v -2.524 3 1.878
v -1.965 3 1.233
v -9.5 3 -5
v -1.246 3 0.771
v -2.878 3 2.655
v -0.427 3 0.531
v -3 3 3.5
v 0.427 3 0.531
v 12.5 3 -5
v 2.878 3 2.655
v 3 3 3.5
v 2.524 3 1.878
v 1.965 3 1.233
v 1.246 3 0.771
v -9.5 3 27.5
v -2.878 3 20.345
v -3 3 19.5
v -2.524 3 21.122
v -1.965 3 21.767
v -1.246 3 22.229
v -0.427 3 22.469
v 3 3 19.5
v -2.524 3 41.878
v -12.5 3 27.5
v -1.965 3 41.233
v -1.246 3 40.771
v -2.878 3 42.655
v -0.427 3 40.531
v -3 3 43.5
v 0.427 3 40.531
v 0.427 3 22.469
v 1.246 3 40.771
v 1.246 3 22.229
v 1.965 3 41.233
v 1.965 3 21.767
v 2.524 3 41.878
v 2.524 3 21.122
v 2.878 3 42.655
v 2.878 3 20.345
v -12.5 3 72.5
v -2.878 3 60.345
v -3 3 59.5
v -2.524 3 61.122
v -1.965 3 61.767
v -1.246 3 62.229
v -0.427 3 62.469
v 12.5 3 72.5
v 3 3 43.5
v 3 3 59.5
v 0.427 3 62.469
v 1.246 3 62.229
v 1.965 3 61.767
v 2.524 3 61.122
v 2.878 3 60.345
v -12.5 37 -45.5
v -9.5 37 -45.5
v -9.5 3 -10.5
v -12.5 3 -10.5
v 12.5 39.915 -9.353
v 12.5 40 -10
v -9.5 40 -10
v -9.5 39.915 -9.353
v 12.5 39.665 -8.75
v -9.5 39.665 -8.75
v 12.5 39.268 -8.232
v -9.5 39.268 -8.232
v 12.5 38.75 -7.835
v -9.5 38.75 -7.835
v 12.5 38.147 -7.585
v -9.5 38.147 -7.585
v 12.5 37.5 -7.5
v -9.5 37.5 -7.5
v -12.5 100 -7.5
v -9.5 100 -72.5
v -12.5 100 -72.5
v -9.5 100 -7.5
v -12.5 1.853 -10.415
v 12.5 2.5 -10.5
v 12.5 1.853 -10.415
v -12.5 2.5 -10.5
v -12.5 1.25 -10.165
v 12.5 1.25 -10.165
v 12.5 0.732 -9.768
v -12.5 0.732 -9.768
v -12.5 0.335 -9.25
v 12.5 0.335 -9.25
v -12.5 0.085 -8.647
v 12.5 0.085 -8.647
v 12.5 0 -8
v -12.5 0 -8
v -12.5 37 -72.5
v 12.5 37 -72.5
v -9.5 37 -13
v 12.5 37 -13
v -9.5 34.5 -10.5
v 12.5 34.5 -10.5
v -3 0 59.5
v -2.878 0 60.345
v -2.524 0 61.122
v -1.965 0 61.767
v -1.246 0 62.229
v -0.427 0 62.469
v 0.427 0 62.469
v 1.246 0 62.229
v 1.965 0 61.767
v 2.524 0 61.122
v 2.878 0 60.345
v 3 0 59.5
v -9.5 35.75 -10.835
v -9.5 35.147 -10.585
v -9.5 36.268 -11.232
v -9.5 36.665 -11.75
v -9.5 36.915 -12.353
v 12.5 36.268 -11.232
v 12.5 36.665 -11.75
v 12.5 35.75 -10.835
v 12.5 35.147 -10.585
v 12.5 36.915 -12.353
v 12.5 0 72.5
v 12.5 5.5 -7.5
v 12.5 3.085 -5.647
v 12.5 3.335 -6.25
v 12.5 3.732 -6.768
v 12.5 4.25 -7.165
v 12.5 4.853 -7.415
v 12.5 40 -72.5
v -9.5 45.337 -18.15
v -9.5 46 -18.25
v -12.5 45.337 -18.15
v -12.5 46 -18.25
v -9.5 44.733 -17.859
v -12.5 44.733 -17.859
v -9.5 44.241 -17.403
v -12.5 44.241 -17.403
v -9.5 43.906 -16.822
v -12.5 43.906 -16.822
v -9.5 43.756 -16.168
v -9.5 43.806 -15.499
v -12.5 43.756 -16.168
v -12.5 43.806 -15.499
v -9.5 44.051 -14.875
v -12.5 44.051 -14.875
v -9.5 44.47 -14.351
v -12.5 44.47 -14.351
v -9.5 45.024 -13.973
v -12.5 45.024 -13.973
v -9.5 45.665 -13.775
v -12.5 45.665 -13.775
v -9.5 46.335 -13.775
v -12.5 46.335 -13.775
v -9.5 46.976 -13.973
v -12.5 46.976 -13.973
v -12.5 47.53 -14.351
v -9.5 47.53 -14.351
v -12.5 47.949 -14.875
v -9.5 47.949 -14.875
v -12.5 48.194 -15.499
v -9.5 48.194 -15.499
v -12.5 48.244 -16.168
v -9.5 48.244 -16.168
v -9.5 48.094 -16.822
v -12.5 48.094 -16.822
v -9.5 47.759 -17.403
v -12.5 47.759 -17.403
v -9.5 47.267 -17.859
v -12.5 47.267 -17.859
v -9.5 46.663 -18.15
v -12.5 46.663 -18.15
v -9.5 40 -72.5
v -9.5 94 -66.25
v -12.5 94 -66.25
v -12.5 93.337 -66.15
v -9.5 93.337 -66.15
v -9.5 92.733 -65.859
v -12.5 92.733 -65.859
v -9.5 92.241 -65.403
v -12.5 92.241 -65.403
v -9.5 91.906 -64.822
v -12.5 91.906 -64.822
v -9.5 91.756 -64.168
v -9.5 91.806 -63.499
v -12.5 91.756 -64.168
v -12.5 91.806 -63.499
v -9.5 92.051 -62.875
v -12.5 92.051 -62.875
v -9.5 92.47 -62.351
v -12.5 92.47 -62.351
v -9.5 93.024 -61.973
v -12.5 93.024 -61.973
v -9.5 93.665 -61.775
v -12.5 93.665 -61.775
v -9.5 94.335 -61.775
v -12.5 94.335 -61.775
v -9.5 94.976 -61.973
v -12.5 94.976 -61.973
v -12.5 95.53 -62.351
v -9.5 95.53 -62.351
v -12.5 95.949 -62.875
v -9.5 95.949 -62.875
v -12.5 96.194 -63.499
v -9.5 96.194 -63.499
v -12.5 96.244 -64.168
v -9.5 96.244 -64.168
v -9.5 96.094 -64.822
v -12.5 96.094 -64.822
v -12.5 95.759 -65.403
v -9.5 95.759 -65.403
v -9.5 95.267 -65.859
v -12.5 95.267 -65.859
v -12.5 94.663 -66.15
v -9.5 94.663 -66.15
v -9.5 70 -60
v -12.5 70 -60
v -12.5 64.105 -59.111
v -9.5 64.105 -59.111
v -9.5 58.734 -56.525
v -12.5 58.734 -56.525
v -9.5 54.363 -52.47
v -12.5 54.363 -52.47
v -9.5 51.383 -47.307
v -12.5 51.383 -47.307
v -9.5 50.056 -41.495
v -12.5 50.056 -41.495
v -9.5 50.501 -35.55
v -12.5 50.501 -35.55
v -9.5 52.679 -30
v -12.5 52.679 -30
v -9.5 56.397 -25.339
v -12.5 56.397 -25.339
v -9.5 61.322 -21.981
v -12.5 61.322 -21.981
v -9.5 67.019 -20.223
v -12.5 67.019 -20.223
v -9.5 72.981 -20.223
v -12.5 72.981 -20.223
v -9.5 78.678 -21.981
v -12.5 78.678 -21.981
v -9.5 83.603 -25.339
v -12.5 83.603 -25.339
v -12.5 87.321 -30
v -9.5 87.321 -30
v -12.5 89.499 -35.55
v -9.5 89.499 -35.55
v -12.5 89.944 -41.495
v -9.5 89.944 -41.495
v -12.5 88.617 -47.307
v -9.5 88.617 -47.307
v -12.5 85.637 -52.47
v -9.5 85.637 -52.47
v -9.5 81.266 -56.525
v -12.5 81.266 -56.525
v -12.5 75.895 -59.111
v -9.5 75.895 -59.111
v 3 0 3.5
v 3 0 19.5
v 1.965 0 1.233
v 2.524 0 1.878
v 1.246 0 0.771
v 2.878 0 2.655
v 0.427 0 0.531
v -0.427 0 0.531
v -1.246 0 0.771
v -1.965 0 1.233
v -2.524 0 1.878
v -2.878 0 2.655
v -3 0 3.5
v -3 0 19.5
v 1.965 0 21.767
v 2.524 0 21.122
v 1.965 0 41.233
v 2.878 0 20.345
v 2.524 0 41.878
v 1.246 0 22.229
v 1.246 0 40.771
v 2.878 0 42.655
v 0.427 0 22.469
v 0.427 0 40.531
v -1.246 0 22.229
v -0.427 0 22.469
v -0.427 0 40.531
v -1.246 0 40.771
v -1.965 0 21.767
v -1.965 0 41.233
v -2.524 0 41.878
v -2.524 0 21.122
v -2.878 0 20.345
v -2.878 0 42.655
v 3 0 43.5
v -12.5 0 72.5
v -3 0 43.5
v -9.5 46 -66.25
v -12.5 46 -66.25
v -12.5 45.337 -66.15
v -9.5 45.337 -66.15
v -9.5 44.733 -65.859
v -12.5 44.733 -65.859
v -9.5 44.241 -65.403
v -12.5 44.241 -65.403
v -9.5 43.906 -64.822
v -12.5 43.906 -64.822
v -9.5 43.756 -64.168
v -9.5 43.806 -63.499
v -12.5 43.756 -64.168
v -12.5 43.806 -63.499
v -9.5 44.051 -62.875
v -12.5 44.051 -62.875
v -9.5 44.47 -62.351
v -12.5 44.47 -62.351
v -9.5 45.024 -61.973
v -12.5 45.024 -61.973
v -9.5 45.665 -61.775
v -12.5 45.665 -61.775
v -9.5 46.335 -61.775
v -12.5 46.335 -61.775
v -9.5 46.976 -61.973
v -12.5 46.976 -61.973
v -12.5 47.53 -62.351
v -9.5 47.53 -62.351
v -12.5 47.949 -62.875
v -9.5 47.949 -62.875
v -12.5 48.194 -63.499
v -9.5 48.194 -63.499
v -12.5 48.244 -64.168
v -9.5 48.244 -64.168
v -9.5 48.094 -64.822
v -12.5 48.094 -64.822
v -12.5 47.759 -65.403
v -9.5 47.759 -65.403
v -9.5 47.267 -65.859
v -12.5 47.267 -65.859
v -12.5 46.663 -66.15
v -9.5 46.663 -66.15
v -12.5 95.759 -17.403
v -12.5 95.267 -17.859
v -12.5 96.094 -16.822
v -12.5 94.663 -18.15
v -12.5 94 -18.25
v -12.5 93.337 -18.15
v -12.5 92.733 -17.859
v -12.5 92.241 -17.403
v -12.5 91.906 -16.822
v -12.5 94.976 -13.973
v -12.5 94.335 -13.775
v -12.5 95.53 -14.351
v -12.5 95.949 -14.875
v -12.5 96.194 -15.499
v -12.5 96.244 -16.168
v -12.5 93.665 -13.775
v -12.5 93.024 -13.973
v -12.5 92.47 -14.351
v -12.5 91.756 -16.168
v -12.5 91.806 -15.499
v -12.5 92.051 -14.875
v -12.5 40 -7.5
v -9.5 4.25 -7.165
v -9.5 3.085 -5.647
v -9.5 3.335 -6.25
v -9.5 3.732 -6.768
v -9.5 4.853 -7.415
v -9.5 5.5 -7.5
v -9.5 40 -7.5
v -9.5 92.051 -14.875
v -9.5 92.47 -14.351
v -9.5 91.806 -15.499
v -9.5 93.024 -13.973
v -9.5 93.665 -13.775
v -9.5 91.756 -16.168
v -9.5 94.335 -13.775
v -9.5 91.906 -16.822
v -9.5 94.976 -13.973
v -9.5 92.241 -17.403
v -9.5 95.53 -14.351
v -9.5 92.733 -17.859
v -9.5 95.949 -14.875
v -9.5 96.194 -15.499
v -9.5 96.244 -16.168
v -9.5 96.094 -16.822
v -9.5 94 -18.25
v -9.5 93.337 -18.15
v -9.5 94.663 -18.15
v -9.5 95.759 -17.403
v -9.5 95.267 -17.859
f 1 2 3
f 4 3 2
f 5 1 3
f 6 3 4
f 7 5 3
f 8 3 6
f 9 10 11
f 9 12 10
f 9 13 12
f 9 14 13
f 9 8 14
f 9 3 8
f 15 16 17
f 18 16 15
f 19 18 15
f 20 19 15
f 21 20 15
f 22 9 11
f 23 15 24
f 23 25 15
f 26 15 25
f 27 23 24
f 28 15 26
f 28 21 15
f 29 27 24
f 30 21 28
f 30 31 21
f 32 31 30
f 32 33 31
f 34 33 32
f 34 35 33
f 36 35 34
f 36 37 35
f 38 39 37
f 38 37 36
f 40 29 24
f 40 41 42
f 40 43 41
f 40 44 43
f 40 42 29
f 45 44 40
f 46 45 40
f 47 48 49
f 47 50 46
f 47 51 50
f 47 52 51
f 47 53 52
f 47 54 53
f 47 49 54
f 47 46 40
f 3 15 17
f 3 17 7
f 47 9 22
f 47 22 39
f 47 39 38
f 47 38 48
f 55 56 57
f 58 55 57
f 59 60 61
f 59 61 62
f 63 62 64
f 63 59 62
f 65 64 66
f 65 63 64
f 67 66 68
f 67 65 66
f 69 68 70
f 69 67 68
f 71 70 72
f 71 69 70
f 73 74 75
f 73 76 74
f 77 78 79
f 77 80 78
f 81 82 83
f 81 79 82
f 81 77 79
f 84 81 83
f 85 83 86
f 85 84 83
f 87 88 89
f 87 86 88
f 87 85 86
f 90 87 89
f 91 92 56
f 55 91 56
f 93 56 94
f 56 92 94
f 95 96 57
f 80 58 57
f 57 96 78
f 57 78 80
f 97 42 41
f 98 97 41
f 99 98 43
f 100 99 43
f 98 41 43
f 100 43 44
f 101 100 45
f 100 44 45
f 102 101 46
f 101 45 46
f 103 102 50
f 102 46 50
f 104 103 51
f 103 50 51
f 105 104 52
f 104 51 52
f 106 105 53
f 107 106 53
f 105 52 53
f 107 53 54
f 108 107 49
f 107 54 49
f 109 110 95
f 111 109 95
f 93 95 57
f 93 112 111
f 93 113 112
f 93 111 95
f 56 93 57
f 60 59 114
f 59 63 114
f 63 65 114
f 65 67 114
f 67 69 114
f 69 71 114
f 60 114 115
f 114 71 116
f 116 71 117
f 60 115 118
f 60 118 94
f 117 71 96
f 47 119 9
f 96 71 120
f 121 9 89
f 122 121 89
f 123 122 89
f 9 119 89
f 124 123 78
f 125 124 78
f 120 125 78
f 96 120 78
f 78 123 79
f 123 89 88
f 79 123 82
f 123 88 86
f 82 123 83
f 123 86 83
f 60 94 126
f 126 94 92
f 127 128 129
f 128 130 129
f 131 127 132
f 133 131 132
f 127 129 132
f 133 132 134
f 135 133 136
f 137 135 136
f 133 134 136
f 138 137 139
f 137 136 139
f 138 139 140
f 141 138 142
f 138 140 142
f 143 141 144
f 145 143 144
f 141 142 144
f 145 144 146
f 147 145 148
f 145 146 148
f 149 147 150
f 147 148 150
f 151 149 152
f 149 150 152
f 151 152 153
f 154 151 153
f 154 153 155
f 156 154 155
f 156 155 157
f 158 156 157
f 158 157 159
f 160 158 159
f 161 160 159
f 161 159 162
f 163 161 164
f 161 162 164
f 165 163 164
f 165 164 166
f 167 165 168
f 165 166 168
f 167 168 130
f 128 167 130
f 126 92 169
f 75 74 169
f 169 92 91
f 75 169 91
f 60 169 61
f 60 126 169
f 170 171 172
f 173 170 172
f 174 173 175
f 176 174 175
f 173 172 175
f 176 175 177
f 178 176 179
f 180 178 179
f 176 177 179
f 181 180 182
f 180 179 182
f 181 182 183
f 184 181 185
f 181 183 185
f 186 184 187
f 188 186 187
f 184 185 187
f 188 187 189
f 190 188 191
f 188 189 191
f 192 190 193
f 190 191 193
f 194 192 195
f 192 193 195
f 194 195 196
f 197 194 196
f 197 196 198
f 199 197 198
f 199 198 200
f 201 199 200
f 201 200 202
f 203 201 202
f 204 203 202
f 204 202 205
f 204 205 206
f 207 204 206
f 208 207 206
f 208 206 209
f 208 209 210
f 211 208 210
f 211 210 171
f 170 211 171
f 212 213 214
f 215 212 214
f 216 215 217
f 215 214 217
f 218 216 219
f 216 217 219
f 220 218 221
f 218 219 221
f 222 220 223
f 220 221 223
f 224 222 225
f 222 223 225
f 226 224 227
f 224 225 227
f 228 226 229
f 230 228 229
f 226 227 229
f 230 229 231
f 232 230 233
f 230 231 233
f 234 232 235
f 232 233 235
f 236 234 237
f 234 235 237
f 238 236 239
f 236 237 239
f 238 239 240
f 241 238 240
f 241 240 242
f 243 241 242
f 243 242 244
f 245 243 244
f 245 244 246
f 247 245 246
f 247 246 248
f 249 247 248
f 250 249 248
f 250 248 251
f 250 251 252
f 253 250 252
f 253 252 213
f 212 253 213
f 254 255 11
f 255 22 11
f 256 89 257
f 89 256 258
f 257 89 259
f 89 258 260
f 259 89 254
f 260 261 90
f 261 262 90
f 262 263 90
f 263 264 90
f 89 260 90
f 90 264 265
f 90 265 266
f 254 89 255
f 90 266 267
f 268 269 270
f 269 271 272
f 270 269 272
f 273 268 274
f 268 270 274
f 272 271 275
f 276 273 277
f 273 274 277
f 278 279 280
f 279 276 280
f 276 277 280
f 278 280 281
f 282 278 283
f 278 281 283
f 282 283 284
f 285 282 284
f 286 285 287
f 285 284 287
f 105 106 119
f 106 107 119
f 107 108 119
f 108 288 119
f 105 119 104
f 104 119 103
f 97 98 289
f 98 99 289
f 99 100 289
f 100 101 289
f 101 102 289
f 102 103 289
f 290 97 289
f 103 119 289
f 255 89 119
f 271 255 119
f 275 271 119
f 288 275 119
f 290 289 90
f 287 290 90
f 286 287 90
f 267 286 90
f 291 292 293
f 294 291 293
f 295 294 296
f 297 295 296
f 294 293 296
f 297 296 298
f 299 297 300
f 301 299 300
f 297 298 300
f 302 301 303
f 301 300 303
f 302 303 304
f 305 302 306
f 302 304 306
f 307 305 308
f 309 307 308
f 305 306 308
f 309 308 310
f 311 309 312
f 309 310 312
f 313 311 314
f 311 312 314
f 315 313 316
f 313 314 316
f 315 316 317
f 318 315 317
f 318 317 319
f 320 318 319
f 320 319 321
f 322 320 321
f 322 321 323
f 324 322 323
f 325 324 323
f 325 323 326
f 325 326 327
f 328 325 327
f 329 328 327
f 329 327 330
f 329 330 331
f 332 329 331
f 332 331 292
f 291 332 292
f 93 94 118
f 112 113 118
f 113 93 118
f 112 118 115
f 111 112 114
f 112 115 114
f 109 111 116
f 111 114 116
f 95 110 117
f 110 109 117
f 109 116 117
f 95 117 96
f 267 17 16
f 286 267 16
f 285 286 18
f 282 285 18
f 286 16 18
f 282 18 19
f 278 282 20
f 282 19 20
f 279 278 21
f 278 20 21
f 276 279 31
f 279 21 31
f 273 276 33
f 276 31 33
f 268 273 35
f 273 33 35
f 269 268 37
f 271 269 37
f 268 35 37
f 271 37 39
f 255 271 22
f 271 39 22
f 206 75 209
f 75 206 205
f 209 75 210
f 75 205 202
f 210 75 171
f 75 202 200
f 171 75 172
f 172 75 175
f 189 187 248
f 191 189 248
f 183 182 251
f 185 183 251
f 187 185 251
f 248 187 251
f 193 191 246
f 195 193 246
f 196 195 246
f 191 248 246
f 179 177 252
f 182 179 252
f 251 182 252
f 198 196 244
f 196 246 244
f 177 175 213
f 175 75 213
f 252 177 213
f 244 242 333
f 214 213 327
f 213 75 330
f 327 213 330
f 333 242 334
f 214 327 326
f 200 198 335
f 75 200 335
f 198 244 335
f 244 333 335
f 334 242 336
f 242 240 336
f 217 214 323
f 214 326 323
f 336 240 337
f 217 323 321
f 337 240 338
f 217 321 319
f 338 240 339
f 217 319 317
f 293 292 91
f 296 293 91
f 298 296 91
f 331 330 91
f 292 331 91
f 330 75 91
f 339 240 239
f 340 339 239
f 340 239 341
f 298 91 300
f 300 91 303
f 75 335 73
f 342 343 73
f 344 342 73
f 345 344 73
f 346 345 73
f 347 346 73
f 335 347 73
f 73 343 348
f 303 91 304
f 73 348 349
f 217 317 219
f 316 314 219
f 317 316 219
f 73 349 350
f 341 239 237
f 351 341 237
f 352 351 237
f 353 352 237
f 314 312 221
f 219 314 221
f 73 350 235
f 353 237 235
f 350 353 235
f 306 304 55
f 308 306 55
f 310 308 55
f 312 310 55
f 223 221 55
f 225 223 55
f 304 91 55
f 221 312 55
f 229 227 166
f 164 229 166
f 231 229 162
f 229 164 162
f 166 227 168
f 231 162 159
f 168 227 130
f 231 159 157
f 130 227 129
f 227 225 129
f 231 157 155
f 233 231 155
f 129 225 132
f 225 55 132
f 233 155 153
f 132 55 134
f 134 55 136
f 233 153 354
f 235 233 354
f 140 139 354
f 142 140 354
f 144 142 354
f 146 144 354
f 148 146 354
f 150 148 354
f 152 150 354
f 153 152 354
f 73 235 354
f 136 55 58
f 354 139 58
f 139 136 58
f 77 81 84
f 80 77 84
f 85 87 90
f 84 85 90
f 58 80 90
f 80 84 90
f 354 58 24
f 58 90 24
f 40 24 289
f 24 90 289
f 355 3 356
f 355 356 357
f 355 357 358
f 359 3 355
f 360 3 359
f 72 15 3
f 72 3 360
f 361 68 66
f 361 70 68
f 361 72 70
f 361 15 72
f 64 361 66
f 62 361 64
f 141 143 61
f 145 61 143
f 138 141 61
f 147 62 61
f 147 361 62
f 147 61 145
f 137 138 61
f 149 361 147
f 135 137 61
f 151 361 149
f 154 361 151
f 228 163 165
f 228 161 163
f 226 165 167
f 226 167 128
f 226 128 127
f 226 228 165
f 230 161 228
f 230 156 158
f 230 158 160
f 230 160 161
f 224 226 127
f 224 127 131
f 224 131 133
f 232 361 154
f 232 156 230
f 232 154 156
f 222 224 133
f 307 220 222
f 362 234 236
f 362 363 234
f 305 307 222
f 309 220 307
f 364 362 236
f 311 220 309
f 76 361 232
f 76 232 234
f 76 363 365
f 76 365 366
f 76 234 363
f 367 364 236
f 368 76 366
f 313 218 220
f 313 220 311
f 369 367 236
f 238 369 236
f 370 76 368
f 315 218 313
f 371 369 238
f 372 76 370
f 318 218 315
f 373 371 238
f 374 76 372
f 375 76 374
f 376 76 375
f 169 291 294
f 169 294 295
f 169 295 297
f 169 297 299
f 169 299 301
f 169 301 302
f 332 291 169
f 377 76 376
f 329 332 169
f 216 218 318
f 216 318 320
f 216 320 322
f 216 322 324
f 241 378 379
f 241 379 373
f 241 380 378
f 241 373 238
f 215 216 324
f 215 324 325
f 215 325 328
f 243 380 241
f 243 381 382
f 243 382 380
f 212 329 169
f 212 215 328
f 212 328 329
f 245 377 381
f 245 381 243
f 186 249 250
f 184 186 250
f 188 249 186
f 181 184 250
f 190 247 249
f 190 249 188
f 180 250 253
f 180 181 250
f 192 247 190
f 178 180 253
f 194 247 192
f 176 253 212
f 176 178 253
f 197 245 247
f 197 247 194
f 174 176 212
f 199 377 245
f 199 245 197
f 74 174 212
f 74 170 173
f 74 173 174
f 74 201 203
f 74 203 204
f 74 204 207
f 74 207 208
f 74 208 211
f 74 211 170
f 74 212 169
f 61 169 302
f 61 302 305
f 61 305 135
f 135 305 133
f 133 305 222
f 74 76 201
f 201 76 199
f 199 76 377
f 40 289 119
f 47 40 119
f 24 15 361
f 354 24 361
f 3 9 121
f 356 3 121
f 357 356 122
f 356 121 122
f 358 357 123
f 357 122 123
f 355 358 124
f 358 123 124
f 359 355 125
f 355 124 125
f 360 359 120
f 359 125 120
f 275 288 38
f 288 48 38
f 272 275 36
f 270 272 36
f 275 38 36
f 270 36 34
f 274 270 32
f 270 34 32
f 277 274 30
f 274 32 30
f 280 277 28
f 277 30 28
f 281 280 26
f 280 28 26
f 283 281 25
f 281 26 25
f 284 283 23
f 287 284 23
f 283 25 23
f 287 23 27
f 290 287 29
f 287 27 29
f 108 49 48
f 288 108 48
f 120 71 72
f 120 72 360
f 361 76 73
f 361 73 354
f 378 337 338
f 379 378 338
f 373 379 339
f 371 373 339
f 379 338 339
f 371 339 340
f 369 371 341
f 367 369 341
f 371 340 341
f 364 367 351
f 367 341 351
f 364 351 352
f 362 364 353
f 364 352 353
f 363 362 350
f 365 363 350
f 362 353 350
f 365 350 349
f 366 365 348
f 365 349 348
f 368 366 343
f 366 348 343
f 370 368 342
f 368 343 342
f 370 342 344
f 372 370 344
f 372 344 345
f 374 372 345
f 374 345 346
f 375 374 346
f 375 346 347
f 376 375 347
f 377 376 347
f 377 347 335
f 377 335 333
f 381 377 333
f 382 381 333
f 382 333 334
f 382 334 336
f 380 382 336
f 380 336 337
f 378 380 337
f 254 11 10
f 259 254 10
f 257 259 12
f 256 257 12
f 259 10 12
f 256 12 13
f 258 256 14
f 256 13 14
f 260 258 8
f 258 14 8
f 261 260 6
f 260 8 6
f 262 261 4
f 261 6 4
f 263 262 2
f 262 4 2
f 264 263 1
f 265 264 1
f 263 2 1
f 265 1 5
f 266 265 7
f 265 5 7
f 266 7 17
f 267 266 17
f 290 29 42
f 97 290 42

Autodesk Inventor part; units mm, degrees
ref_plane "YZ Plane" through (0, 0, 0) normal (1, 0, 0) x (0, 1, 0)
ref_plane "XZ Plane" through (0, 0, 0) normal (0, 1, 0) x (-1, 0, 0)
ref_plane "XY Plane" through (0, 0, 0) normal (0, 0, 1) x (1, 0, 0)
sketch "Skizze1" plane through (0, 0, 0) normal (0, 1, 0) x (-1, 0, 0)
  line L0 (12.5, 72.5) -> (-12.5, 72.5)
  line L1 (-12.5, 72.5) -> (-12.5, -72.5)
  line L2 (-12.5, -72.5) -> (12.5, -72.5)
  line L3 (12.5, -72.5) -> (12.5, 72.5)
  point P0 (0, 0)
  point P1 (0, 72.5)
  point P2 (-12.5, 0)
  dimension "d0" = 25
  dimension "d1" = 145
extrude "Extrusion1" add sketch "Skizze1" along normal blind 100
sketch "Skizze2" plane through (12.5, 0, 72.5) normal (1, 0, 0) x (0, 0, -1)
  line L0 (0, 0) -> (145, 0) construction
  line L1 (145, 0) -> (145, 100) construction
  line L2 (0, 100) -> (145, 100) construction
  line L3 (0, 0) -> (0, 100) construction
  line L4 (0, 100) -> (80, 100)
  line L5 (80, 100) -> (80, 40)
  line L6 (80, 40) -> (0, 40)
  line L7 (0, 40) -> (0, 100)
  point P0 (72.5, 0)
  dimension "d4" = 80
  dimension "d5" = 60
extrude "Extrusion2" cut sketch "Skizze2" against normal through all
sketch "Skizze3" plane through (12.5, 0, 72.5) normal (1, 0, 0) x (0, 0, -1)
  line L0 (80, 100) -> (80, 40) construction
  line L1 (80, 40) -> (0, 40) construction
  line L2 (0, 0) -> (0, 40) construction
  line L3 (0, 0) -> (145, 0) construction
  line L4 (145, 0) -> (145, 100) construction
  line L5 (80, 100) -> (145, 100) construction
  line L6 (0, 40) -> (80, 40)
  line L7 (80, 40) -> (80, 3)
  line L8 (80, 3) -> (0, 3)
  line L9 (0, 3) -> (0, 40)
  line L10 (80, 100) -> (145, 100)
  line L11 (145, 100) -> (145, 40)
  line L12 (145, 40) -> (80, 40)
  line L13 (80, 40) -> (80, 100)
  line L14 (145, 0) -> (83, 0)
  line L15 (83, 0) -> (83, 37)
  line L16 (83, 37) -> (145, 37)
  line L17 (145, 37) -> (145, 0)
  point P0 (72.5, 0)
  dimension "d8" = 3
  dimension "d9" = 3
  dimension "d10" = 3
extrude "Extrusion3" cut sketch "Skizze3" against normal blind 22
sketch "Skizze4" plane through (-9.5, 0, 72.5) normal (1, 0, 0) x (0, 0, -1)
  line L0 (0, 40) -> (80, 40) construction
  line L1 (0, 3) -> (0, 40) construction
  line L2 (80, 3) -> (0, 3) construction
  line L3 (80, 40) -> (80, 3) construction
  line L4 (80, 40) -> (80, 3)
  line L5 (80, 3) -> (45, 3)
  line L6 (45, 3) -> (80, 40)
  line L7 (80, 3) -> (0, 3) projected
  line L8 (145, 0) -> (83, 0) construction
  line L9 (145, 37) -> (145, 0) construction
  line L10 (83, 37) -> (145, 37) construction
  line L11 (83, 0) -> (83, 37) construction
  line L12 (118, 37) -> (83, 3)
  line L13 (83, 37) -> (118, 37)
  line L14 (83, 3) -> (83, 37)
  line L15 (45, 3) -> (0, 3)
  line L16 (0, 0) -> (0, 40) projected
  line L17 (0, 40) -> (0, 3)
  line L18 (0, 40) -> (80, 40)
  line L19 (83, 3) -> (83, 0)
  line L20 (145, 0) -> (0, 0) projected
  line L21 (83, 0) -> (145, 0)
  line L22 (145, 37) -> (145, 0) projected
  line L23 (145, 0) -> (145, 37)
  line L24 (145, 37) -> (118, 37)
  point P0 (72.5, 0)
  dimension "d13" = 35
  dimension "d14" = 35
extrude "Extrusion4" cut sketch "Skizze4" against normal through all contours L6 L7 L16 L18 | L24 L22 L20 L19 L12
sketch "Skizze5" plane through (-9.5, 0, 72.5) normal (1, 0, 0) x (0, 0, -1)
  line L0 (80, 40) -> (80, 100) construction
  line L1 (145, 40) -> (80, 40) construction
  line L2 (145, 100) -> (145, 40) construction
  line L3 (80, 100) -> (145, 100) construction
  line L4 (80, 40) -> (80, 100) construction
  line L5 (80, 70) -> (145, 70) construction
  line L6 (145, 100) -> (145, 40) construction
  line L7 (80, 100) -> (145, 100) construction
  line L8 (112.5, 100) -> (112.5, 40) construction
  line L9 (145, 40) -> (80, 40) construction
  point P0 (72.5, 0)
  point P1 (88.5, 94)
  point P2 (136.5, 94)
  point P3 (136.5, 46)
  point P4 (88.5, 46)
  dimension "d17" = 48
  dimension "d18" = 48
hole "Bohrung1" at (-9.5, 94, -16) at (-9.5, 94, -64) at (-9.5, 46, -64) at (-9.5, 46, -16) direction (-1, 0, 0) diameter 4.5 end through all
sketch "Skizze6" plane through (-9.5, 0, 72.5) normal (1, 0, 0) x (0, 0, -1)
  circle A0 centre (136.5, 46) radius 2.25 projected
  circle A1 centre (88.5, 94) radius 2.25 projected
  circle A2 centre (136.5, 94) radius 2.25 projected
  circle A3 centre (88.5, 46) radius 2.25 projected
  line L0 (80, 40) -> (80, 100) projected
  line L1 (145, 40) -> (80, 40) projected
  line L2 (145, 100) -> (145, 40) projected
  line L3 (80, 100) -> (145, 100) projected
  point P0 (72.5, 0)
  point P1 (112.5, 70)
  point P2 (80, 70)
  point P3 (112.5, 100)
hole "Bohrung2" at (-9.5, 70, -40) direction (-1, 0, 0) diameter 40 end through all
sketch "Skizze7" plane through (12.5, 3, 72.5) normal (0, 1, 0) x (1, 0, 0)
  line L0 (0, 80) -> (0, 0) construction
  line L1 (0, 80) -> (-22, 80) construction
  line L2 (-22, 80) -> (-22, 45) construction
  line L3 (-22, 45) -> (-25, 45) construction
  line L4 (-25, 0) -> (-25, 45) construction
  line L5 (0, 0) -> (-25, 0) construction
  line L6 (-9.5, 13) -> (-9.5, 29)
  arc A0 (-9.5, 29) -> (-15.5, 29) centre (-12.5, 29) ccw
  line L7 (-15.5, 29) -> (-15.5, 13)
  arc A1 (-15.5, 13) -> (-9.5, 13) centre (-12.5, 13) ccw
  line L8 (-9.5, 53) -> (-9.5, 69)
  arc A2 (-9.5, 69) -> (-15.5, 69) centre (-12.5, 69) ccw
  line L9 (-15.5, 69) -> (-15.5, 53)
  arc A3 (-15.5, 53) -> (-9.5, 53) centre (-12.5, 53) ccw
  line L10 (0, 10) -> (-25, 10) construction
  line L11 (0, 32) -> (-25, 32) construction
  line L12 (0, 80) -> (0, 0) construction
  line L13 (-25, 0) -> (-25, 45) construction
  line L14 (0, 50) -> (-22, 50) construction
  line L15 (0, 72) -> (-22, 72) construction
  point P0 (-12.5, 72.5)
  point P1 (-12.5, 0)
  dimension "d33" = 6
  dimension "d34" = 22
  dimension "d35" = 10
  dimension "d36" = 40
  dimension "d37" = 22
extrude "Extrusion5" cut sketch "Skizze7" against normal through all
fillet "Rundung1" radius 2.5 4 edges at (1.5, 40, -7.5) (1.5, 37, -10.5) (0, 0, -10.5) (1.5, 3, -7.5)
equation "\"d14\" = d13"
equation "\"d18\" = d17"
equation "\"d37\" = d34"
properties part number "Motorhalterung_Links"
